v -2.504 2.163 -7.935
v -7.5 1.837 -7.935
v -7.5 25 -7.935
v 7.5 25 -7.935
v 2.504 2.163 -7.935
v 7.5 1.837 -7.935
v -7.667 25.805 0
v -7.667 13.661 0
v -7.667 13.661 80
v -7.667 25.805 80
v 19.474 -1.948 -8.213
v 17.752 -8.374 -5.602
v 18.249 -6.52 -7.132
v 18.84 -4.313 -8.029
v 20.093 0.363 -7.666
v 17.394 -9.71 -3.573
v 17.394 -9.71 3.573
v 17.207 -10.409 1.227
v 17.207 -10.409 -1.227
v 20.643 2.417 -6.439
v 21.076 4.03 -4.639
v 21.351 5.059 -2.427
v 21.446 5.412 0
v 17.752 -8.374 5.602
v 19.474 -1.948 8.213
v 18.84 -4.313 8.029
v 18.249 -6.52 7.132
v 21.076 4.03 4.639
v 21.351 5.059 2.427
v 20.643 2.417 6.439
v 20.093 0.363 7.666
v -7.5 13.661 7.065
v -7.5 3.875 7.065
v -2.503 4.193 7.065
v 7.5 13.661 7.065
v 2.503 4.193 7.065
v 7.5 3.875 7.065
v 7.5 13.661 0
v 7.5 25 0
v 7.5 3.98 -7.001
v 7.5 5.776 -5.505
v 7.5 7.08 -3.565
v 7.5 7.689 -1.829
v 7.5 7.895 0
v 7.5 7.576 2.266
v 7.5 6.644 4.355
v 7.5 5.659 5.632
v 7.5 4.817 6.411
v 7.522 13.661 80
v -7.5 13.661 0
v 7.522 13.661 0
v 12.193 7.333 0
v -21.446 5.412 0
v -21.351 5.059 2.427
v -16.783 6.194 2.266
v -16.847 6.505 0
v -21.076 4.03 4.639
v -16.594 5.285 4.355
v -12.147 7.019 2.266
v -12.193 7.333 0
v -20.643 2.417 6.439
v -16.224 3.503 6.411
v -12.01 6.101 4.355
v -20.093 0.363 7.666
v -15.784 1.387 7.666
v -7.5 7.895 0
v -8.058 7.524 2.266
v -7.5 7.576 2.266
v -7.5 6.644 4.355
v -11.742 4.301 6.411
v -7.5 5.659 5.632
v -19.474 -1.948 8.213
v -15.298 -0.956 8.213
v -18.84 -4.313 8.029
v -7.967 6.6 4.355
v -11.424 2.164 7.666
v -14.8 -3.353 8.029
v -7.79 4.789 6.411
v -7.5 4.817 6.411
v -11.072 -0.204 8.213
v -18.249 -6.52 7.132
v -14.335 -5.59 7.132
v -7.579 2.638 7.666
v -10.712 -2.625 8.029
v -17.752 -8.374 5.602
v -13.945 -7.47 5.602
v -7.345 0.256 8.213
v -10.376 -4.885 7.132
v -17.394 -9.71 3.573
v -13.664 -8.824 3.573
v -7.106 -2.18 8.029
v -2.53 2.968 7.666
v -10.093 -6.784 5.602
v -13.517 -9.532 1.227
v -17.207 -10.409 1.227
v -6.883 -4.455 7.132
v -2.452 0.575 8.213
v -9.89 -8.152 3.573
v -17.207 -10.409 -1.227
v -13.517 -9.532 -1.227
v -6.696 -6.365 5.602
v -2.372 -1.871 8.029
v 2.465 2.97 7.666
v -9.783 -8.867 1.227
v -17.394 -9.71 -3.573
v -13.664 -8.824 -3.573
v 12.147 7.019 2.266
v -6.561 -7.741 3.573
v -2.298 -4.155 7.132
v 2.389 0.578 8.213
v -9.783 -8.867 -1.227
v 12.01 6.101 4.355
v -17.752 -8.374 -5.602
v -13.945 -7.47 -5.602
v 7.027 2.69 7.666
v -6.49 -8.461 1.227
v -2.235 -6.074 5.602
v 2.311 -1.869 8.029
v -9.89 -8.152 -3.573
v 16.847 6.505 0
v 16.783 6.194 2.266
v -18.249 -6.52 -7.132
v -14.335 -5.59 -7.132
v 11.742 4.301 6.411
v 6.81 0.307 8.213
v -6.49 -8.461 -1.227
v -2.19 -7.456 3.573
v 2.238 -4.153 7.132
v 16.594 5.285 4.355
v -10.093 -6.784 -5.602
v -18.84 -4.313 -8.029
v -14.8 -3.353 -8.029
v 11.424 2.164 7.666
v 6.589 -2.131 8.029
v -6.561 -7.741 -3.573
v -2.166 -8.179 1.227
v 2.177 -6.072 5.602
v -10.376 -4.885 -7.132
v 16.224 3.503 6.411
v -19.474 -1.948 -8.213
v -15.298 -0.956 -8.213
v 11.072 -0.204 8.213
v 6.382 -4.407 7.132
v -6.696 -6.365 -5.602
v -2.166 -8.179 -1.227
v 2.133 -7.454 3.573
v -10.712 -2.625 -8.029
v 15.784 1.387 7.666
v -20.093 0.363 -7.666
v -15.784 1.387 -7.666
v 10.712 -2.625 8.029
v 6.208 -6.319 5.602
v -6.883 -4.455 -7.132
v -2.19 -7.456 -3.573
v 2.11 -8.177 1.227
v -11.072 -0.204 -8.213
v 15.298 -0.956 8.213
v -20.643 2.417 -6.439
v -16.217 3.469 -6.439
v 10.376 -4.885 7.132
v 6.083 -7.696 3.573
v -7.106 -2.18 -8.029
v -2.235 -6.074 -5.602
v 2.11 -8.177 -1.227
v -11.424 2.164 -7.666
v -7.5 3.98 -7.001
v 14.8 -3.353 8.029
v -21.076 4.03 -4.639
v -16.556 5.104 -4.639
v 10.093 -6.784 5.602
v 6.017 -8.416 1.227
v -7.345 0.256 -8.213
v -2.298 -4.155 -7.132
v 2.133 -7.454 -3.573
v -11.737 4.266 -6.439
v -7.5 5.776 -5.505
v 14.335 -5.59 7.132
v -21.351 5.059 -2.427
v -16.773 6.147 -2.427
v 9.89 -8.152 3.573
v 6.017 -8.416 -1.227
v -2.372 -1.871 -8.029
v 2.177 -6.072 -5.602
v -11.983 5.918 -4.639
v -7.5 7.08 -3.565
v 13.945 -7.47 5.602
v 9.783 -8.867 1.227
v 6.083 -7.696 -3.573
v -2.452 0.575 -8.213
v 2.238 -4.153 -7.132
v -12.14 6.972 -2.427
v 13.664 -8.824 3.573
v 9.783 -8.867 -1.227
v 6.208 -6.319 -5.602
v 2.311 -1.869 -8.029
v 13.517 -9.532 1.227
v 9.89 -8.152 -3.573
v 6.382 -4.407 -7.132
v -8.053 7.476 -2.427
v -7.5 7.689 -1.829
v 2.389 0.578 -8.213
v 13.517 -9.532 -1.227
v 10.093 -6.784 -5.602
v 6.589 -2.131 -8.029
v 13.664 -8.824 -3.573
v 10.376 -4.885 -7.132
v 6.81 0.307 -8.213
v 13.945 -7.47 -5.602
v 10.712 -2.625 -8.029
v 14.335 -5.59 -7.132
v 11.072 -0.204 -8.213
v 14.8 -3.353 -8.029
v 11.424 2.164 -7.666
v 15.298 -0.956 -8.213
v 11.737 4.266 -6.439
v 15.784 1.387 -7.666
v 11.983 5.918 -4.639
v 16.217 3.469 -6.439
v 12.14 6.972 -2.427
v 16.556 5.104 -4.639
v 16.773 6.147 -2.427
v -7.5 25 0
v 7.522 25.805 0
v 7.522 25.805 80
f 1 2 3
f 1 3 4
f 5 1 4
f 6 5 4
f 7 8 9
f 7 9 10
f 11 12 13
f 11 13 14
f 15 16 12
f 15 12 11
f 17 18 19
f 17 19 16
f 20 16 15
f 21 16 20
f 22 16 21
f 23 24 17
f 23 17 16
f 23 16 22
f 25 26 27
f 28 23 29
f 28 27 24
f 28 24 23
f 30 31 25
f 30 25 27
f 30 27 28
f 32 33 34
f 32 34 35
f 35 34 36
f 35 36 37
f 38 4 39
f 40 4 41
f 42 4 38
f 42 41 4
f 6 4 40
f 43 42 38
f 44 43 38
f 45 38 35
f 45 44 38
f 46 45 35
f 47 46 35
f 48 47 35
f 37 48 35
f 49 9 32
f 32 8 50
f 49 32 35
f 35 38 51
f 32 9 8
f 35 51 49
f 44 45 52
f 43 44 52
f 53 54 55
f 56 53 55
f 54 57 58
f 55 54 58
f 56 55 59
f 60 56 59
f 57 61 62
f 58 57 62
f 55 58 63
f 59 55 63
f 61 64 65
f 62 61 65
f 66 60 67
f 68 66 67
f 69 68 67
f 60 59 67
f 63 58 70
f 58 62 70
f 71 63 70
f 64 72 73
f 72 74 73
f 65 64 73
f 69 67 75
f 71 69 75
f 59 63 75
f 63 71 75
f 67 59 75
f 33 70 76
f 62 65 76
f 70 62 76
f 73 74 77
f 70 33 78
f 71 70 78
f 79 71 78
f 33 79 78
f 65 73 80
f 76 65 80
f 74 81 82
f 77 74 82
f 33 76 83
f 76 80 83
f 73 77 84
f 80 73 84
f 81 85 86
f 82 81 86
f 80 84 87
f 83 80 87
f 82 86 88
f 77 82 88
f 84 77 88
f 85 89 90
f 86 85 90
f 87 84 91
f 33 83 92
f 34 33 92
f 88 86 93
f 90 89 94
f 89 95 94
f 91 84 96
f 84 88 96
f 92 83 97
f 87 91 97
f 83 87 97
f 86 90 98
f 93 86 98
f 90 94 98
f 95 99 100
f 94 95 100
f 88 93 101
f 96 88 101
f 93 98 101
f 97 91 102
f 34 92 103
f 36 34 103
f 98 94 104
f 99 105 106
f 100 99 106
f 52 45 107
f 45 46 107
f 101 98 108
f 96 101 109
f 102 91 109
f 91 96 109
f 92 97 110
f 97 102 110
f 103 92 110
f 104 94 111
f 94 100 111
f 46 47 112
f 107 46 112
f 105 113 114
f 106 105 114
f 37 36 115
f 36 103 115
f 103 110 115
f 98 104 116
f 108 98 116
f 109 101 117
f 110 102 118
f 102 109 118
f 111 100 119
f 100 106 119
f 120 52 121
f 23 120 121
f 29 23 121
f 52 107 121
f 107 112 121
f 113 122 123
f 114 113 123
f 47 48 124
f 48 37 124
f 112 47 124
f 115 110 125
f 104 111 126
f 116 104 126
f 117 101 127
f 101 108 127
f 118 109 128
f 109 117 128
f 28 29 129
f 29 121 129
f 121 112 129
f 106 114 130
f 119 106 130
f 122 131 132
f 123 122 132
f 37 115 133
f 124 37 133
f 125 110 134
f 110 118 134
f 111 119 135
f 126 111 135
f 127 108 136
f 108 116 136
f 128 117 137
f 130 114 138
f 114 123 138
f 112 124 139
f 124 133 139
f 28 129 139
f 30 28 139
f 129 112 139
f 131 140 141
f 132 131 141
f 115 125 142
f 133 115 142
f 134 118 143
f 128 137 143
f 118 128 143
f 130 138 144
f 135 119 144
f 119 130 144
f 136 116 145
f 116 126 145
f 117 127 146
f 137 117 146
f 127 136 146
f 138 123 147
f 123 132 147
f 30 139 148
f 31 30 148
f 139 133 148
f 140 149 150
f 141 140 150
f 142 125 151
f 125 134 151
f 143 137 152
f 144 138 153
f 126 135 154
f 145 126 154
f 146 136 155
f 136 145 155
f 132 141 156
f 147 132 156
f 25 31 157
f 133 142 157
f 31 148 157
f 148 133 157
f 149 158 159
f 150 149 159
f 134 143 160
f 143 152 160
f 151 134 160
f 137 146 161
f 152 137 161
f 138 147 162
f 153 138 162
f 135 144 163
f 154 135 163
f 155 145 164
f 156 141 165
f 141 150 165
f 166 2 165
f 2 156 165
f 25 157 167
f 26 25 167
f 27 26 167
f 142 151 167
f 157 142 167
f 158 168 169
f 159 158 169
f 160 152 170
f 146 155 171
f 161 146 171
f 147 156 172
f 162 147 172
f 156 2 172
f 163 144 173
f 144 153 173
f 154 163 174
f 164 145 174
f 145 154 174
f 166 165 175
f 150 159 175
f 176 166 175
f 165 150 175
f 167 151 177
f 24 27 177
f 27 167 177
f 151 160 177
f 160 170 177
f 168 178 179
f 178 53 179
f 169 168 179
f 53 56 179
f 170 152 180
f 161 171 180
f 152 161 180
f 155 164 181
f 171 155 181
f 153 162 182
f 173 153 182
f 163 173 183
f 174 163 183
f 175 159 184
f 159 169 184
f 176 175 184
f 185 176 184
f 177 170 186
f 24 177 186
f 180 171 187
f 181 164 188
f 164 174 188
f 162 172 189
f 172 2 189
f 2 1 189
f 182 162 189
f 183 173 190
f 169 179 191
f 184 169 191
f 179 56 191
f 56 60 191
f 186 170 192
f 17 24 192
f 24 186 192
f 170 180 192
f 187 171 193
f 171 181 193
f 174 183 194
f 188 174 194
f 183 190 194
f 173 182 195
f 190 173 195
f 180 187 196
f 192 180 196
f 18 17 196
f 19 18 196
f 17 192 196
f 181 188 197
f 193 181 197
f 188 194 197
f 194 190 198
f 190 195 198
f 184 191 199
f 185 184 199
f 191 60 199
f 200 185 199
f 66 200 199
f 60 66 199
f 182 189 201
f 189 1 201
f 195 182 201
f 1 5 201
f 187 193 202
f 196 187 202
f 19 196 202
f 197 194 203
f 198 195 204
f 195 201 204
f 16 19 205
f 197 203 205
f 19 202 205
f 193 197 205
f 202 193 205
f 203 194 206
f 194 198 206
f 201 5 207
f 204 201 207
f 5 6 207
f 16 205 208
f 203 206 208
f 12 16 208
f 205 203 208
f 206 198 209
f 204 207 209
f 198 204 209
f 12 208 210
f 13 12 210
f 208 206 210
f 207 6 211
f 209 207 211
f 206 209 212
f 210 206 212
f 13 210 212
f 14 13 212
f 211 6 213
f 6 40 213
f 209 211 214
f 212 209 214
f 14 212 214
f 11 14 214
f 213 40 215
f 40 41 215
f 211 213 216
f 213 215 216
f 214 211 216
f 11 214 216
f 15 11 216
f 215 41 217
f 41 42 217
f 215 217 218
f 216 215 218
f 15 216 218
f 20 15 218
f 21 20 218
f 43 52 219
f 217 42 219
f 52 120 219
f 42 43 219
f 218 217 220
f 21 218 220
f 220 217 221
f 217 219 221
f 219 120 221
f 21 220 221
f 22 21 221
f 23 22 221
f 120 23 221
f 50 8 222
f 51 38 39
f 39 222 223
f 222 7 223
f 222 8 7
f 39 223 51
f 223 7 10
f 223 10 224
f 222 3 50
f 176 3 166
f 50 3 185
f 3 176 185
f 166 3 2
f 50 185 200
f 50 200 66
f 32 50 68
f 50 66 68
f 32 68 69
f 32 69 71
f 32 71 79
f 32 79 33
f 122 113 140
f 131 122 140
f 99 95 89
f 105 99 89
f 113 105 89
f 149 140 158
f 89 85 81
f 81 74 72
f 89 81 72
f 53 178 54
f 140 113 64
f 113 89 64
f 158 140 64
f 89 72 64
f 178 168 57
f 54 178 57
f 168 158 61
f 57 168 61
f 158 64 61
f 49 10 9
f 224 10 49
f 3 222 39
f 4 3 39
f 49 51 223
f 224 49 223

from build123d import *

# Parameters (mm, degrees)
F0_R          = 8.2355585824
F1_ANGLE_BACK = 15
F1_ANGLE      = 30
F2_W          = 15
F2_H          = 15
F3_DEPTH      = 25
F4_W          = 15.1891945861
F4_H          = 12.1442461386
F5_DEPTH      = 80


with BuildPart() as f1:
    # F0 (on Right) → F1 (revolve)
    with BuildSketch(Plane.YZ, mode=Mode.PRIVATE) as f1_sk:
        Circle(F0_R)
    revolve(f1_sk.sketch.rotate(Axis((0, -74.6255367994, -4.2161336169), (0, 0, -1)), -F1_ANGLE_BACK), axis=Axis((0, -74.6255367994, -4.2161336169), (0, 0, -1)), revolution_arc=F1_ANGLE)

    # F2 (on Front) → F3 (join)
    with BuildSketch(Plane.XZ):
        with Locations((0, -0.4352101311)):
            Rectangle(F2_W, F2_H)
    extrude(amount=-F3_DEPTH)

    # F4 (on Top) → F5 (join)
    with BuildSketch(Plane.XY):
        with Locations((-0.0722266268, 19.7329348885)):
            Rectangle(F4_W, F4_H)
    extrude(amount=F5_DEPTH)


solid = f1.part
